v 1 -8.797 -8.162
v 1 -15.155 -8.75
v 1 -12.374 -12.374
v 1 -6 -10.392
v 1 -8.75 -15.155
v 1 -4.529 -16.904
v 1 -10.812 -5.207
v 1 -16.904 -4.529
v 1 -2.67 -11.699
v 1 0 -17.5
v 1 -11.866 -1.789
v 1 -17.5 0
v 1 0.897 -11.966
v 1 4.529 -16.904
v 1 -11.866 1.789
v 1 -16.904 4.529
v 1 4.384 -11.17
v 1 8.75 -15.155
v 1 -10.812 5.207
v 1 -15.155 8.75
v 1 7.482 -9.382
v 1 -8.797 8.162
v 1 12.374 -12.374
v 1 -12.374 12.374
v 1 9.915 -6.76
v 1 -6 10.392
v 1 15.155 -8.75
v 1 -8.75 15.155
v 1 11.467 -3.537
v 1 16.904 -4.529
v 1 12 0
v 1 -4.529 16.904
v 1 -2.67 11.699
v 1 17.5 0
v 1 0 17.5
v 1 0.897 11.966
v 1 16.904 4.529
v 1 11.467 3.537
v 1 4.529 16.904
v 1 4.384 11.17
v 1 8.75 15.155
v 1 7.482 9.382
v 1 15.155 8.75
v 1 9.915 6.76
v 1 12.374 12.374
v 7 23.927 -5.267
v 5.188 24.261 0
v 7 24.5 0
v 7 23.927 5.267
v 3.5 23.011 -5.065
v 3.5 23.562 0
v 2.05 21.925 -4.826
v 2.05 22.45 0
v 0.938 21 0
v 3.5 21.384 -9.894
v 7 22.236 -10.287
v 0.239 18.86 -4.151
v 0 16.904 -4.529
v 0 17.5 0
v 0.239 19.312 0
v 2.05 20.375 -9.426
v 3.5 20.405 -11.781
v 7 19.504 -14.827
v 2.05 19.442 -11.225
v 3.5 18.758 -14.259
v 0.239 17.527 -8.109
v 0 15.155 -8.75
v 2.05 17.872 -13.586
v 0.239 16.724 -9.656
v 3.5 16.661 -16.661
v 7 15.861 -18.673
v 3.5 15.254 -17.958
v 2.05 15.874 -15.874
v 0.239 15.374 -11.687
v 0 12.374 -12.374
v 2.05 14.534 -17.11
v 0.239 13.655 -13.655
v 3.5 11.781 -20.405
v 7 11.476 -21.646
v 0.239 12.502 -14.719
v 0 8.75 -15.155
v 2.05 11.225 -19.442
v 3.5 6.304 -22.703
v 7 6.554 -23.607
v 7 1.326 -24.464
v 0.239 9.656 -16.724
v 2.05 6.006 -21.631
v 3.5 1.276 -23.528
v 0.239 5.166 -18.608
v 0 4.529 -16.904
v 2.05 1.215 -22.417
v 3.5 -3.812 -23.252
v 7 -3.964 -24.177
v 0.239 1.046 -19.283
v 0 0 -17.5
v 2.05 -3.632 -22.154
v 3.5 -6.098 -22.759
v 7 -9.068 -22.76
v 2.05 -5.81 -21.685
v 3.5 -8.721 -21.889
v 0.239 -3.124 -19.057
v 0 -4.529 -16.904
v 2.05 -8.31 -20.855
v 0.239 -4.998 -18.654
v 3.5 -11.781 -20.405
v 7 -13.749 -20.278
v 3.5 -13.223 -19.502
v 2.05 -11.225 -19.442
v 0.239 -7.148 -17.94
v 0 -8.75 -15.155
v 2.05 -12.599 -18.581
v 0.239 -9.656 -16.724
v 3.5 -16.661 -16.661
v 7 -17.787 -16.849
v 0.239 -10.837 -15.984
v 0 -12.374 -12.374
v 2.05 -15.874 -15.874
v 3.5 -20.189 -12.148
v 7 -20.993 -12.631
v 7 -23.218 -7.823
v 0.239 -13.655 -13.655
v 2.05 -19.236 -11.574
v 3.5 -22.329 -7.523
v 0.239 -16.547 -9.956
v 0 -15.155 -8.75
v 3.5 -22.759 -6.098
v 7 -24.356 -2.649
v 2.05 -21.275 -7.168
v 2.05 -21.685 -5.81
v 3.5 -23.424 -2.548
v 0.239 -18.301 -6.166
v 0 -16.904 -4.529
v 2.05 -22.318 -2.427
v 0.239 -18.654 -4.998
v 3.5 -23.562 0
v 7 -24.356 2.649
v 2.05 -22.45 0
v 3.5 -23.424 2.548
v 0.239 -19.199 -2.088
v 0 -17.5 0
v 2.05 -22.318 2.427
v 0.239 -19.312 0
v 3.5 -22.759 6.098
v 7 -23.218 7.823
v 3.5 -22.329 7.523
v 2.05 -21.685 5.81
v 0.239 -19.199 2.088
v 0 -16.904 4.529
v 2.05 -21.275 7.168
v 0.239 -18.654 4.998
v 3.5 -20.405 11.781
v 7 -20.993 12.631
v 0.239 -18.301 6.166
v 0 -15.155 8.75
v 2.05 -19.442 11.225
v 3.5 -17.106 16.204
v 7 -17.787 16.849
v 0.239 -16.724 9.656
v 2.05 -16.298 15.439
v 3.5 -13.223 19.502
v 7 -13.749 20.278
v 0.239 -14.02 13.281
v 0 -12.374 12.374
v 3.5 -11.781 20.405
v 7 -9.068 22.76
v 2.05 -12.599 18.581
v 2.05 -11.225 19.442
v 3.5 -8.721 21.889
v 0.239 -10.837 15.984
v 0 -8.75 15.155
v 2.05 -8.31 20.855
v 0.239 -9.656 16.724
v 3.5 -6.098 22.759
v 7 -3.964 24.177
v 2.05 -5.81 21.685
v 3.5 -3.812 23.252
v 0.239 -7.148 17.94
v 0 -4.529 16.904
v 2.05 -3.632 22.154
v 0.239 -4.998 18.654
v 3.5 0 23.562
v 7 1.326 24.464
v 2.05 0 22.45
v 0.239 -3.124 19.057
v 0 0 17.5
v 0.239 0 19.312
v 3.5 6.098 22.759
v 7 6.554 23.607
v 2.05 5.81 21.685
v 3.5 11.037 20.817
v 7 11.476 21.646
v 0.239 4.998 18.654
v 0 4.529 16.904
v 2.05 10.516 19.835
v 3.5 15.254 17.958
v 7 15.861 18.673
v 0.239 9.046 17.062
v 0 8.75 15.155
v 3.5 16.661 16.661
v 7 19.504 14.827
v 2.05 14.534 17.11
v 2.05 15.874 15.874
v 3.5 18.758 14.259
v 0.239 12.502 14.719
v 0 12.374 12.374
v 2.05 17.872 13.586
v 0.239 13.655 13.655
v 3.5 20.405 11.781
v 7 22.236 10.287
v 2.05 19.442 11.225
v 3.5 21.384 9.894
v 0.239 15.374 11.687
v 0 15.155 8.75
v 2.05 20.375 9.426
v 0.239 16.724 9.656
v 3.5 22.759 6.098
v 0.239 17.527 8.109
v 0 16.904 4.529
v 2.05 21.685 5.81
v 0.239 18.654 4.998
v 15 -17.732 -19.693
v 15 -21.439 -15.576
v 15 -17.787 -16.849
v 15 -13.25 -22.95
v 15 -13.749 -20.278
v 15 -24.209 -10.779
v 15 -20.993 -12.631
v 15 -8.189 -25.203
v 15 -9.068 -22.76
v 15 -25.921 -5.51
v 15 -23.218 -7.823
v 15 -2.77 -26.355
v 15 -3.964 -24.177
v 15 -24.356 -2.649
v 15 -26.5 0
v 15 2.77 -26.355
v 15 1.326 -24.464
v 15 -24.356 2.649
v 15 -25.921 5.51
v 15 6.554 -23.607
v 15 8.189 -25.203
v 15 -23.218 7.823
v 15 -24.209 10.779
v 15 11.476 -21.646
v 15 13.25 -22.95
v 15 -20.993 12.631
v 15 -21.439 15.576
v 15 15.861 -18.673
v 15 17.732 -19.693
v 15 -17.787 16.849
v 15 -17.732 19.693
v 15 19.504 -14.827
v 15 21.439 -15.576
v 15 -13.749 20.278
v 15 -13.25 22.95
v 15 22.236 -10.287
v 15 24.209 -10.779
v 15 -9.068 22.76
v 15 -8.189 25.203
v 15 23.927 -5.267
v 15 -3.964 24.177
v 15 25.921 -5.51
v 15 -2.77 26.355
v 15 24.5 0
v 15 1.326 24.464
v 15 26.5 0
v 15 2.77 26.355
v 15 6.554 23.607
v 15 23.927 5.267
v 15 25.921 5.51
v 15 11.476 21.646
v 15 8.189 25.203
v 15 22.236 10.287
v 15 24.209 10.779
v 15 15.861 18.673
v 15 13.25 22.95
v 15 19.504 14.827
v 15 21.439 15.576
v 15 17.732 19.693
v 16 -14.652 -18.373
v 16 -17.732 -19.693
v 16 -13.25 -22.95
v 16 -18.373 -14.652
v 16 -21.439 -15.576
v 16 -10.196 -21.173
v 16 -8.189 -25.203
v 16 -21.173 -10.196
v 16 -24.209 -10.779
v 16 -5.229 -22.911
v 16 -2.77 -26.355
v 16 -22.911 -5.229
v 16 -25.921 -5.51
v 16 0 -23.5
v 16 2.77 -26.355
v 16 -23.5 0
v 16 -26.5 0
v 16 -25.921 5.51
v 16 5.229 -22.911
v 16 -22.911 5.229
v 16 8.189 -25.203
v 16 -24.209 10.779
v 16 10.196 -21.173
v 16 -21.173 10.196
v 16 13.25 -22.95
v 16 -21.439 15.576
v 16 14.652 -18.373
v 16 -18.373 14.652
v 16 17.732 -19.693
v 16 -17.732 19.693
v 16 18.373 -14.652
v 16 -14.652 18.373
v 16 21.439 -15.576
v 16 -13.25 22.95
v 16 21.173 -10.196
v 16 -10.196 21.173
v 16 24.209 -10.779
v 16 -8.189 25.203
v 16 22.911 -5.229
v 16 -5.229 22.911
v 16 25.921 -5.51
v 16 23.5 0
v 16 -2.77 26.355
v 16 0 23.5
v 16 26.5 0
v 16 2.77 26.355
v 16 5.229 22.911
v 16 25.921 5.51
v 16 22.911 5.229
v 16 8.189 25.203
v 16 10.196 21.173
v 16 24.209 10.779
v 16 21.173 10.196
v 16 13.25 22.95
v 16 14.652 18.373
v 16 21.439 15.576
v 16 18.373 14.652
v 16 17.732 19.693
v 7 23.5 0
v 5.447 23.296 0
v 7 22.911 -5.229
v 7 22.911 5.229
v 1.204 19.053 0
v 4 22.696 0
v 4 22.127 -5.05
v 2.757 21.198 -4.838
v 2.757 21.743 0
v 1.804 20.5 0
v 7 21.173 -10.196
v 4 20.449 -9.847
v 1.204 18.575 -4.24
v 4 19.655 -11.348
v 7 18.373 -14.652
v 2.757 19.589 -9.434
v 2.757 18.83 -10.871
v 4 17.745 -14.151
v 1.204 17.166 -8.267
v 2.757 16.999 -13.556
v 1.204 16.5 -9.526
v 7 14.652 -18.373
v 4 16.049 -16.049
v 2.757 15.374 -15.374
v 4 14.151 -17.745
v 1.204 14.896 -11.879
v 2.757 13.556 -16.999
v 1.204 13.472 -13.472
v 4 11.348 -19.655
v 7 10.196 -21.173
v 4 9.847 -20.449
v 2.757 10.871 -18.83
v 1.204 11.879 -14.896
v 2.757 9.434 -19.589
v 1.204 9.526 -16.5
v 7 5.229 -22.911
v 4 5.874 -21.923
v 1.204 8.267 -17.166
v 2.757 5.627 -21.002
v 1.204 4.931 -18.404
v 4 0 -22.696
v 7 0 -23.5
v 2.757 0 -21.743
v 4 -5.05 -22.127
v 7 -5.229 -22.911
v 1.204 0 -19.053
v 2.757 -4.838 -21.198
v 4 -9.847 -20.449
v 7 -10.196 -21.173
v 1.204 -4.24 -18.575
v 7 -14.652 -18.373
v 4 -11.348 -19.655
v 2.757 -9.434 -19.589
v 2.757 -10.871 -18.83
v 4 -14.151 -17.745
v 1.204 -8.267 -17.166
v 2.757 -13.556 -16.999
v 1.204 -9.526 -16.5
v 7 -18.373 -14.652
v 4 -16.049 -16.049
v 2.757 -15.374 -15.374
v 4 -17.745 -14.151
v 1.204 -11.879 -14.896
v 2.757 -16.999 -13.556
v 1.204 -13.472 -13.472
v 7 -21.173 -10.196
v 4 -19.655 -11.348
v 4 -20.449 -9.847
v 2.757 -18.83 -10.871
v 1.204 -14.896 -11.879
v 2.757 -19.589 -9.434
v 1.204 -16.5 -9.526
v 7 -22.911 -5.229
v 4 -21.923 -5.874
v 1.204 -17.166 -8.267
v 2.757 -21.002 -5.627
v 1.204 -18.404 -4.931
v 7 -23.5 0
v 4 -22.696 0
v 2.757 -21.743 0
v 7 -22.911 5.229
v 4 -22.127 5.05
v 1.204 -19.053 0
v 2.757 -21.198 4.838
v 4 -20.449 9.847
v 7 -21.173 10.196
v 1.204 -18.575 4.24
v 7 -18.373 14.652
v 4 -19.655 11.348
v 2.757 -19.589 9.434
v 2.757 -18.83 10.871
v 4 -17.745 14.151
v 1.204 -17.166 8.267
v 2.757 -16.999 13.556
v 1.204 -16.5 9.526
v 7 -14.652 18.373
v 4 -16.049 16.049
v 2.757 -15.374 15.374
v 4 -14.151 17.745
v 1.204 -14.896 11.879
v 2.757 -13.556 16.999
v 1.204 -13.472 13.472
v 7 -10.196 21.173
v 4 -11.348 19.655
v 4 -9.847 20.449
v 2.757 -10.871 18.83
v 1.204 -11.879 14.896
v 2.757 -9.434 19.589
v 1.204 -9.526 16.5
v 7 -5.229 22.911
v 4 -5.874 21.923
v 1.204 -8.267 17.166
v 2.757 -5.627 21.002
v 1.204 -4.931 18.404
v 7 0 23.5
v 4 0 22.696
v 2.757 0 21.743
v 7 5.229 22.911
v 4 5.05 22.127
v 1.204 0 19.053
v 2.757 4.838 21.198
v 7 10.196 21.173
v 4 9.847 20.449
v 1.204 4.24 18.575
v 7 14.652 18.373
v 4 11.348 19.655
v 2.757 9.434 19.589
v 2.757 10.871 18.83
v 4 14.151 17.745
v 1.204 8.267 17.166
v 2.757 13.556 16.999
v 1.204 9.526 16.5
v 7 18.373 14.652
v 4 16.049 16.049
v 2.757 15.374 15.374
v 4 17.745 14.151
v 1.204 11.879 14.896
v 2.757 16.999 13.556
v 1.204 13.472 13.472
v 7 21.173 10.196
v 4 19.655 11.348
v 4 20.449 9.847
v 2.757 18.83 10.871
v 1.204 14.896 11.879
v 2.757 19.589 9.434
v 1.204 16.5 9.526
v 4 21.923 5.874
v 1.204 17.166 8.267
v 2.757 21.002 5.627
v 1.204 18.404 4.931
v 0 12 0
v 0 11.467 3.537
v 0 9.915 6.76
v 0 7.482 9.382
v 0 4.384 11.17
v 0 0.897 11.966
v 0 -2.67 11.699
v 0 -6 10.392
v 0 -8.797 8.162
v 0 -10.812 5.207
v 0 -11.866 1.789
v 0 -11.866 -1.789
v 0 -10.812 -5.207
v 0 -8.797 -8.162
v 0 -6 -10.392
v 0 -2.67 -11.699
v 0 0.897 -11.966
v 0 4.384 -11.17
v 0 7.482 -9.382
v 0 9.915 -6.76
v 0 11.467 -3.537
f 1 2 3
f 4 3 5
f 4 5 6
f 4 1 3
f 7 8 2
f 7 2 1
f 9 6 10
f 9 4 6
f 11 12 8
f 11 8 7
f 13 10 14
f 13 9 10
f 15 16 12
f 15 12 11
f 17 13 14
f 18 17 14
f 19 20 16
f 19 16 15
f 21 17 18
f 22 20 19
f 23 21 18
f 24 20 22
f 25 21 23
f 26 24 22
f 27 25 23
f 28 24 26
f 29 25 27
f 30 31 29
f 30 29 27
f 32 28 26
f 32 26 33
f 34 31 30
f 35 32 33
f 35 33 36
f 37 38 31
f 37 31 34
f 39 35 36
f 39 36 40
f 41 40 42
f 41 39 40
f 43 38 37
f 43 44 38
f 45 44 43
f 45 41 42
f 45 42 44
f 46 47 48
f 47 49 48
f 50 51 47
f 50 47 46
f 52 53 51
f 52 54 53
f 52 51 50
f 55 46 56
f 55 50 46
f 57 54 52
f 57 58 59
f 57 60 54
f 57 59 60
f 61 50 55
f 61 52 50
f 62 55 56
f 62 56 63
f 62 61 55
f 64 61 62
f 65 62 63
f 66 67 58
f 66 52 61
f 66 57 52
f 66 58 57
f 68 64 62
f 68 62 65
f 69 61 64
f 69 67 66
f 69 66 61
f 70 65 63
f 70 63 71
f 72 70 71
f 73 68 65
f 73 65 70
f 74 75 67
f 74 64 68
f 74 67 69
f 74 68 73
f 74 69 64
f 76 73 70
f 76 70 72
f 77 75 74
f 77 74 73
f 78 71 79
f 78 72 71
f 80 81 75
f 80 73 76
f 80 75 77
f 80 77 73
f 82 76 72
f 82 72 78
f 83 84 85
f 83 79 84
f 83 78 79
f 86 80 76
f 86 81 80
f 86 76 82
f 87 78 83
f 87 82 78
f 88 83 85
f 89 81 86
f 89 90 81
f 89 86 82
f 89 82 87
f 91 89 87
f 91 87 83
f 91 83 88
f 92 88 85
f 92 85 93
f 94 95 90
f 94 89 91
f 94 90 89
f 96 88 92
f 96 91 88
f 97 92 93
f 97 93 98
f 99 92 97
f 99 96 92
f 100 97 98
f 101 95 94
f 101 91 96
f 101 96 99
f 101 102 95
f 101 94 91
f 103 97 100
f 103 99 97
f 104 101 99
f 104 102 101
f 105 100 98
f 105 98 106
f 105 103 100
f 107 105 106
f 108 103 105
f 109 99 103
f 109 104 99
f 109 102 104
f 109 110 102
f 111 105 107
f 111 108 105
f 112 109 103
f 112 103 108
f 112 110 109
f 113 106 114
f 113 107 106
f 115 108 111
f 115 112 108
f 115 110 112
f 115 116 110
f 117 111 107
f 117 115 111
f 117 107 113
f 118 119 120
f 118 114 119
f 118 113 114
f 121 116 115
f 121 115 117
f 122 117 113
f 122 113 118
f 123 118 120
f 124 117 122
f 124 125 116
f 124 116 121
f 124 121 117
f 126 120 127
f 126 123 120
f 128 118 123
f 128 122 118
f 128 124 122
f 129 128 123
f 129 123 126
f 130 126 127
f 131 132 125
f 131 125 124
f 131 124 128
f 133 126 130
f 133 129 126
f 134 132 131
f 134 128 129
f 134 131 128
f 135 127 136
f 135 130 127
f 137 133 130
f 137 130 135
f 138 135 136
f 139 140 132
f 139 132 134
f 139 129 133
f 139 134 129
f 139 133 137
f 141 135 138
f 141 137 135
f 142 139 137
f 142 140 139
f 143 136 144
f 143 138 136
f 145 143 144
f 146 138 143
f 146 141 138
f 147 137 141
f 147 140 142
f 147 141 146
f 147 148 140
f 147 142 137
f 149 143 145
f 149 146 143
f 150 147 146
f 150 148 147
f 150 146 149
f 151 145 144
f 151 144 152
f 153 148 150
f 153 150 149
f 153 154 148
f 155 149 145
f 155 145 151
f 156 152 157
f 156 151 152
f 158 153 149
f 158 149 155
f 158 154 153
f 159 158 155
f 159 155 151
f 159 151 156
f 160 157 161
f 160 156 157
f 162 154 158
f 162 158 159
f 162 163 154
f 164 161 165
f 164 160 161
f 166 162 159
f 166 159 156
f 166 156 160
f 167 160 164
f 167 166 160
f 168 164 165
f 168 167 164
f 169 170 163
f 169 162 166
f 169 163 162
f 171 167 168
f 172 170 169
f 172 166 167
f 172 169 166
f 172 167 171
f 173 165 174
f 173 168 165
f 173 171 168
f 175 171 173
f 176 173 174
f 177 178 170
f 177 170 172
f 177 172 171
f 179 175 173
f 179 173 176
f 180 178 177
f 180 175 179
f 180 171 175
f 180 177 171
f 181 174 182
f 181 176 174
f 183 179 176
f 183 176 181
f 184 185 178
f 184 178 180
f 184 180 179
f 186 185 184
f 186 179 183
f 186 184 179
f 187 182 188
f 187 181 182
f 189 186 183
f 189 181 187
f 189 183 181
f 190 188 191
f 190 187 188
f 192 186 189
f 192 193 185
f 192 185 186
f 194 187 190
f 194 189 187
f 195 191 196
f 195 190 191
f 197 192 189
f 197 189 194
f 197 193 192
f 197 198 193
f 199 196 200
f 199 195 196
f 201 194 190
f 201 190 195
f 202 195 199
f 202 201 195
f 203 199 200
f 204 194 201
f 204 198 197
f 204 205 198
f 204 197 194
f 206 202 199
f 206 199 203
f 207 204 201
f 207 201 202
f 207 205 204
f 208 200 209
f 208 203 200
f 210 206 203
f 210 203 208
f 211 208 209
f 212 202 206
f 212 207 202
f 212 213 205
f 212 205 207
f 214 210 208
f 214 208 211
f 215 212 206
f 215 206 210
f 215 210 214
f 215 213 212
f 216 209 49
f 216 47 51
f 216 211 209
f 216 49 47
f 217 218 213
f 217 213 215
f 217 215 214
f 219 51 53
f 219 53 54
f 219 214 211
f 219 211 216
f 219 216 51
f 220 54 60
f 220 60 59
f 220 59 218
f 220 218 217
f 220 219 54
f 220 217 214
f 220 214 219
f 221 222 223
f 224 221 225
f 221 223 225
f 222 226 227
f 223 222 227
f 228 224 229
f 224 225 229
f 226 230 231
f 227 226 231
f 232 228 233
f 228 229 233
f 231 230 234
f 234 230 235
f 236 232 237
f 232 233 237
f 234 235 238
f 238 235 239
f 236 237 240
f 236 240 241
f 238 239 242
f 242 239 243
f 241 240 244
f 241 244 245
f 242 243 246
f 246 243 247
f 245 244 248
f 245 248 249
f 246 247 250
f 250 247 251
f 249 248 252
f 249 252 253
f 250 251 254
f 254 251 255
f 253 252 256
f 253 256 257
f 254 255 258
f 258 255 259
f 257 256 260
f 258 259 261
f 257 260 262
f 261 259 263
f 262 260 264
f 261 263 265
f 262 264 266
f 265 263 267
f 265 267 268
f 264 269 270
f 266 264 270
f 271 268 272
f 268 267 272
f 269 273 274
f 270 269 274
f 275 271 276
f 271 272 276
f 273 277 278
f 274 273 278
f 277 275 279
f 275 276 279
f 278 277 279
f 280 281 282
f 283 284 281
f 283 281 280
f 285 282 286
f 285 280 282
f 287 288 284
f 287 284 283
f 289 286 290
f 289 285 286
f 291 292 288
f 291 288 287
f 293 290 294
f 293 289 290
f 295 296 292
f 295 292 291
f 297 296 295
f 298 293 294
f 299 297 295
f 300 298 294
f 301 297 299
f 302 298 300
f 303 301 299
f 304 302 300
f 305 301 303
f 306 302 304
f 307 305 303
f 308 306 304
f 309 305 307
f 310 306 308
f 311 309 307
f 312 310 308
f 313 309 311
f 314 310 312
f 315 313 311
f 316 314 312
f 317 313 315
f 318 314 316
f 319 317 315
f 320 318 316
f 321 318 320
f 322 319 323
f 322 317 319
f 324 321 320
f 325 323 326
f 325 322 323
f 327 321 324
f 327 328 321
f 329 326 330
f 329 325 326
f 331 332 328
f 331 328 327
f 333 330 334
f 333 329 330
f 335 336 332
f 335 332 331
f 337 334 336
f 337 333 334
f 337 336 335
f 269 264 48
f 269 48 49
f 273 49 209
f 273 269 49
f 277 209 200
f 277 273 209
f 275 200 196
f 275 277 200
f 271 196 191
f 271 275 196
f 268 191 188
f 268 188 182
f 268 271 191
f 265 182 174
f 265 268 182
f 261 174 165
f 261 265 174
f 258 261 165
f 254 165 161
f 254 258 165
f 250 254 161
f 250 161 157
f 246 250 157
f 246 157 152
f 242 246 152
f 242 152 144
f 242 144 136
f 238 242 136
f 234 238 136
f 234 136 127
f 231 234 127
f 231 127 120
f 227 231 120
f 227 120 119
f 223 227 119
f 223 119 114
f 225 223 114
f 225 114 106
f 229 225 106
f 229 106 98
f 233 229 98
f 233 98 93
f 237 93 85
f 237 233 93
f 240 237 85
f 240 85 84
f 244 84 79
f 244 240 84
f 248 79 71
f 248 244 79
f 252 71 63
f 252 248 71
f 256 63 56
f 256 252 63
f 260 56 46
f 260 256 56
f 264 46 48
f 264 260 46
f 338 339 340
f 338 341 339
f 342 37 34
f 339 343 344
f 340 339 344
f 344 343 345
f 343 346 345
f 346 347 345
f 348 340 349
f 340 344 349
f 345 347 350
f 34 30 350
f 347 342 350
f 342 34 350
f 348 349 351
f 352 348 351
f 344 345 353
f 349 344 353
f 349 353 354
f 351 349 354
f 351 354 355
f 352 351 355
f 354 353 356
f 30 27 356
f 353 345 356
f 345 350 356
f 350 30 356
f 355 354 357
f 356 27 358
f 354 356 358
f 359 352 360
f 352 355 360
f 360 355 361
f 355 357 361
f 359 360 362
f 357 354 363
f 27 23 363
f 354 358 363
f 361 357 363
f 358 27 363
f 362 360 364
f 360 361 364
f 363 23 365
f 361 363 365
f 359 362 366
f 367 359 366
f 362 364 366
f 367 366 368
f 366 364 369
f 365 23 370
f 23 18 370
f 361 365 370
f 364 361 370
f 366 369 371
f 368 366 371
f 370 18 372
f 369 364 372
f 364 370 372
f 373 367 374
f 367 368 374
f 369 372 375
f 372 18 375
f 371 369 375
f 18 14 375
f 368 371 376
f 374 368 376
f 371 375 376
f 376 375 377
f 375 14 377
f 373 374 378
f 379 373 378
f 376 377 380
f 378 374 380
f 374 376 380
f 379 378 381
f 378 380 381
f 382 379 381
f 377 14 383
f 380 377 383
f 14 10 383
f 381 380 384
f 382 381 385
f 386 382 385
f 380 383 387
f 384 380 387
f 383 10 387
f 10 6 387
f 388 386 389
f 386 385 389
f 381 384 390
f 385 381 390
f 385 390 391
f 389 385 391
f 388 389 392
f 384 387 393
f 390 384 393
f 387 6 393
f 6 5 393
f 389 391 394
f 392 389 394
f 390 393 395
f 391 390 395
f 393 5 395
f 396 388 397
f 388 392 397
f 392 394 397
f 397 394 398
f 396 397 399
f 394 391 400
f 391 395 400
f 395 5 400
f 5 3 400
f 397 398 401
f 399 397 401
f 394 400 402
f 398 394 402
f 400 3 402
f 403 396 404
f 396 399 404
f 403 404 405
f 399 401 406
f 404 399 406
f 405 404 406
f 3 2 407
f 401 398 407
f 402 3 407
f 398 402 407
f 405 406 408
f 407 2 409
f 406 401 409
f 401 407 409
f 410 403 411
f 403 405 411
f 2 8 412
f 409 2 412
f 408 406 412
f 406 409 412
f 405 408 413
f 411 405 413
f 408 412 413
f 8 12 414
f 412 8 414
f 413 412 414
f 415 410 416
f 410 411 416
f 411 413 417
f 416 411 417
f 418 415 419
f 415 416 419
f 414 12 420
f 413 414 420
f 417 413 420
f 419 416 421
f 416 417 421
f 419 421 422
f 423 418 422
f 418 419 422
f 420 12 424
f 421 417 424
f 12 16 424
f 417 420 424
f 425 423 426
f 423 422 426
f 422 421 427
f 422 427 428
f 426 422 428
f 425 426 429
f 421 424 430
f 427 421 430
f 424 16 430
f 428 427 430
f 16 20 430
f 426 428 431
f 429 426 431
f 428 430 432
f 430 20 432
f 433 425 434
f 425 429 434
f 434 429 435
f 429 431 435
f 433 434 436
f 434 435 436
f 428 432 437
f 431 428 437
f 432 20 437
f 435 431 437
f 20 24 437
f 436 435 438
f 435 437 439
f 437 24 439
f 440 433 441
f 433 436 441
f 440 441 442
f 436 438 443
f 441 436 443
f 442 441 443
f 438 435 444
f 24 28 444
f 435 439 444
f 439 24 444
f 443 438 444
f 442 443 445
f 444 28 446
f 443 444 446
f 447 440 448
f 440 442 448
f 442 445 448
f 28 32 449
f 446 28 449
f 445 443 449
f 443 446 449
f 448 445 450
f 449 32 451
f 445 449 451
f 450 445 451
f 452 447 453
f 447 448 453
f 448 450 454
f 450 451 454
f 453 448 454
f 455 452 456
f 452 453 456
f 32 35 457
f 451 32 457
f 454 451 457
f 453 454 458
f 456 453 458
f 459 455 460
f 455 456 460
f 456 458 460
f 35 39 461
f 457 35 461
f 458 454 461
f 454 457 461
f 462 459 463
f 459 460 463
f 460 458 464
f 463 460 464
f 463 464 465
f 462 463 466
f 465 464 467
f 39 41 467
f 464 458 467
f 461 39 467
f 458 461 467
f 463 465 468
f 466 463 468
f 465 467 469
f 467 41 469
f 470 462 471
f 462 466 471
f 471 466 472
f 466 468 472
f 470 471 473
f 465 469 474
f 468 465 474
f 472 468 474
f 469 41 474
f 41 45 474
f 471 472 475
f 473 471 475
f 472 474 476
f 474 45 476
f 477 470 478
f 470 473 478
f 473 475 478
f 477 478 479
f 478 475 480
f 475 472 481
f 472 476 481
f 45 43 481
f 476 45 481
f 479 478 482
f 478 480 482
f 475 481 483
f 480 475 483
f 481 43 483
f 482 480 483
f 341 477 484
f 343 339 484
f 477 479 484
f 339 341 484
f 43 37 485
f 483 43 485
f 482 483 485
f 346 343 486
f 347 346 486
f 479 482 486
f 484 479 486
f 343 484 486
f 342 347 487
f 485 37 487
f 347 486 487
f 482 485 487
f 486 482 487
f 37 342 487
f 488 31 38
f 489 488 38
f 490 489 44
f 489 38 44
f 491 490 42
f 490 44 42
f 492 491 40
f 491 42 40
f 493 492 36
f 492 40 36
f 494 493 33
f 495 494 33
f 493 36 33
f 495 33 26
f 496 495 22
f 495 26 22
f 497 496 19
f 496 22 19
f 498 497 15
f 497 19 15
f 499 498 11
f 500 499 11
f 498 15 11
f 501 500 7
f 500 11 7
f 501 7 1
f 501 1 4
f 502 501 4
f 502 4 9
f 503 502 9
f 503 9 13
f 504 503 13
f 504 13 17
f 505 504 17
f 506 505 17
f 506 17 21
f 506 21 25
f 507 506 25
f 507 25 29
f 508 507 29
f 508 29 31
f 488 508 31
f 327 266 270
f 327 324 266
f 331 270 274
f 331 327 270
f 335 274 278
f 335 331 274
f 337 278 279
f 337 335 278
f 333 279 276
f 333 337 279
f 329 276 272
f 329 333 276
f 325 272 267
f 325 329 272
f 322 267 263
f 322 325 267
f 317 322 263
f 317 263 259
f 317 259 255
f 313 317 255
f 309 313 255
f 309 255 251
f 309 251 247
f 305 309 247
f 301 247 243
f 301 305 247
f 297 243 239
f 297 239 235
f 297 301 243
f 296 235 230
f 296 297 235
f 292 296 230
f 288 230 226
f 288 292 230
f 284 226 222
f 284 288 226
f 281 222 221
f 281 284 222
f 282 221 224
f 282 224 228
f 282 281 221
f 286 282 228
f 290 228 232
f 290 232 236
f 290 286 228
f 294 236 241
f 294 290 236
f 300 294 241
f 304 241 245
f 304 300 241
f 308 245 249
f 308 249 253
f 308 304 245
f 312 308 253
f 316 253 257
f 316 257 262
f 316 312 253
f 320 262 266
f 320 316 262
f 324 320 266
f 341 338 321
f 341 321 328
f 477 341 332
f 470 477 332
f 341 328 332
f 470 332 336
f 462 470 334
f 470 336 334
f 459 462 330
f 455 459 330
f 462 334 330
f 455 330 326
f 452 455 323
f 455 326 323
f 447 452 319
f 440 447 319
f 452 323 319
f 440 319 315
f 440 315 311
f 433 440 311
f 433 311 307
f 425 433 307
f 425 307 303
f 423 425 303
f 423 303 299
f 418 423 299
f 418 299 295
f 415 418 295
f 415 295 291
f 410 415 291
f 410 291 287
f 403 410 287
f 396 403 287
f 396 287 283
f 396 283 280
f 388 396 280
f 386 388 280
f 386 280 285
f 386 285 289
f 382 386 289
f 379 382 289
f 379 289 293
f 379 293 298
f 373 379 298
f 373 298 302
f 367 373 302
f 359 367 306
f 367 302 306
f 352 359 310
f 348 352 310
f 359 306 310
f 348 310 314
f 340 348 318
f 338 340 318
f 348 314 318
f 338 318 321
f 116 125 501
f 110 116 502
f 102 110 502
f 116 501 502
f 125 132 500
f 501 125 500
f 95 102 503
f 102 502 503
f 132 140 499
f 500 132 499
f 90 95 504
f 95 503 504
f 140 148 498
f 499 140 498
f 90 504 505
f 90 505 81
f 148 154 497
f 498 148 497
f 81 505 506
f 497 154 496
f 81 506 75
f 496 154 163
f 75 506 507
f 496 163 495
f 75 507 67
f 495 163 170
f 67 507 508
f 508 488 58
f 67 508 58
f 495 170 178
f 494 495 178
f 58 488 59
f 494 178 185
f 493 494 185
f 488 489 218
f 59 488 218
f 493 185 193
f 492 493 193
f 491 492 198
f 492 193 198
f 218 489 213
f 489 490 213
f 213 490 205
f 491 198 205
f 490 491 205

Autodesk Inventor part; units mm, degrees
ref_plane "YZ Plane" through (0, 0, 0) normal (1, 0, 0) x (0, 1, 0)
ref_plane "XZ Plane" through (0, 0, 0) normal (0, 1, 0) x (-1, 0, 0)
ref_plane "XY Plane" through (0, 0, 0) normal (0, 0, 1) x (1, 0, 0)
sketch "Boceto1" plane through (0, 0, 0) normal (0, 0, 1) x (1, 0, 0)
  line L0 (0, 12) -> (0, 17.5)
  arc A0 (7, 24.5) -> (0, 17.5) centre (7, 17.5) ccw
  line L1 (7, 24.5) -> (15, 24.5)
  line L2 (15, 24.5) -> (15, 26.5)
  line L3 (0, 0) -> (11, 0)
  dimension "d0" = 49
  dimension "d1" = 15
  dimension "d2" = 2
  dimension "d3" = 7
  dimension "d4" = 12
surface revolve "SuperficieRevolución1" sketch "Boceto1" angle 360 about axis through (0, 0, 0) along (1, 0, 0) shown yes curves L2 L1 A0 L0
thicken "Engrosado1" operation new thickness 1 both sides no extend neighbours no toward (1, 0, 0) faces at (15, 25.5767, -2.114) (12.3333, 24.4206, -1.9714) (6.4769, 24.1634, -3.9269) (0, 15.4972, -1.396)
properties part number "cazoleta"
